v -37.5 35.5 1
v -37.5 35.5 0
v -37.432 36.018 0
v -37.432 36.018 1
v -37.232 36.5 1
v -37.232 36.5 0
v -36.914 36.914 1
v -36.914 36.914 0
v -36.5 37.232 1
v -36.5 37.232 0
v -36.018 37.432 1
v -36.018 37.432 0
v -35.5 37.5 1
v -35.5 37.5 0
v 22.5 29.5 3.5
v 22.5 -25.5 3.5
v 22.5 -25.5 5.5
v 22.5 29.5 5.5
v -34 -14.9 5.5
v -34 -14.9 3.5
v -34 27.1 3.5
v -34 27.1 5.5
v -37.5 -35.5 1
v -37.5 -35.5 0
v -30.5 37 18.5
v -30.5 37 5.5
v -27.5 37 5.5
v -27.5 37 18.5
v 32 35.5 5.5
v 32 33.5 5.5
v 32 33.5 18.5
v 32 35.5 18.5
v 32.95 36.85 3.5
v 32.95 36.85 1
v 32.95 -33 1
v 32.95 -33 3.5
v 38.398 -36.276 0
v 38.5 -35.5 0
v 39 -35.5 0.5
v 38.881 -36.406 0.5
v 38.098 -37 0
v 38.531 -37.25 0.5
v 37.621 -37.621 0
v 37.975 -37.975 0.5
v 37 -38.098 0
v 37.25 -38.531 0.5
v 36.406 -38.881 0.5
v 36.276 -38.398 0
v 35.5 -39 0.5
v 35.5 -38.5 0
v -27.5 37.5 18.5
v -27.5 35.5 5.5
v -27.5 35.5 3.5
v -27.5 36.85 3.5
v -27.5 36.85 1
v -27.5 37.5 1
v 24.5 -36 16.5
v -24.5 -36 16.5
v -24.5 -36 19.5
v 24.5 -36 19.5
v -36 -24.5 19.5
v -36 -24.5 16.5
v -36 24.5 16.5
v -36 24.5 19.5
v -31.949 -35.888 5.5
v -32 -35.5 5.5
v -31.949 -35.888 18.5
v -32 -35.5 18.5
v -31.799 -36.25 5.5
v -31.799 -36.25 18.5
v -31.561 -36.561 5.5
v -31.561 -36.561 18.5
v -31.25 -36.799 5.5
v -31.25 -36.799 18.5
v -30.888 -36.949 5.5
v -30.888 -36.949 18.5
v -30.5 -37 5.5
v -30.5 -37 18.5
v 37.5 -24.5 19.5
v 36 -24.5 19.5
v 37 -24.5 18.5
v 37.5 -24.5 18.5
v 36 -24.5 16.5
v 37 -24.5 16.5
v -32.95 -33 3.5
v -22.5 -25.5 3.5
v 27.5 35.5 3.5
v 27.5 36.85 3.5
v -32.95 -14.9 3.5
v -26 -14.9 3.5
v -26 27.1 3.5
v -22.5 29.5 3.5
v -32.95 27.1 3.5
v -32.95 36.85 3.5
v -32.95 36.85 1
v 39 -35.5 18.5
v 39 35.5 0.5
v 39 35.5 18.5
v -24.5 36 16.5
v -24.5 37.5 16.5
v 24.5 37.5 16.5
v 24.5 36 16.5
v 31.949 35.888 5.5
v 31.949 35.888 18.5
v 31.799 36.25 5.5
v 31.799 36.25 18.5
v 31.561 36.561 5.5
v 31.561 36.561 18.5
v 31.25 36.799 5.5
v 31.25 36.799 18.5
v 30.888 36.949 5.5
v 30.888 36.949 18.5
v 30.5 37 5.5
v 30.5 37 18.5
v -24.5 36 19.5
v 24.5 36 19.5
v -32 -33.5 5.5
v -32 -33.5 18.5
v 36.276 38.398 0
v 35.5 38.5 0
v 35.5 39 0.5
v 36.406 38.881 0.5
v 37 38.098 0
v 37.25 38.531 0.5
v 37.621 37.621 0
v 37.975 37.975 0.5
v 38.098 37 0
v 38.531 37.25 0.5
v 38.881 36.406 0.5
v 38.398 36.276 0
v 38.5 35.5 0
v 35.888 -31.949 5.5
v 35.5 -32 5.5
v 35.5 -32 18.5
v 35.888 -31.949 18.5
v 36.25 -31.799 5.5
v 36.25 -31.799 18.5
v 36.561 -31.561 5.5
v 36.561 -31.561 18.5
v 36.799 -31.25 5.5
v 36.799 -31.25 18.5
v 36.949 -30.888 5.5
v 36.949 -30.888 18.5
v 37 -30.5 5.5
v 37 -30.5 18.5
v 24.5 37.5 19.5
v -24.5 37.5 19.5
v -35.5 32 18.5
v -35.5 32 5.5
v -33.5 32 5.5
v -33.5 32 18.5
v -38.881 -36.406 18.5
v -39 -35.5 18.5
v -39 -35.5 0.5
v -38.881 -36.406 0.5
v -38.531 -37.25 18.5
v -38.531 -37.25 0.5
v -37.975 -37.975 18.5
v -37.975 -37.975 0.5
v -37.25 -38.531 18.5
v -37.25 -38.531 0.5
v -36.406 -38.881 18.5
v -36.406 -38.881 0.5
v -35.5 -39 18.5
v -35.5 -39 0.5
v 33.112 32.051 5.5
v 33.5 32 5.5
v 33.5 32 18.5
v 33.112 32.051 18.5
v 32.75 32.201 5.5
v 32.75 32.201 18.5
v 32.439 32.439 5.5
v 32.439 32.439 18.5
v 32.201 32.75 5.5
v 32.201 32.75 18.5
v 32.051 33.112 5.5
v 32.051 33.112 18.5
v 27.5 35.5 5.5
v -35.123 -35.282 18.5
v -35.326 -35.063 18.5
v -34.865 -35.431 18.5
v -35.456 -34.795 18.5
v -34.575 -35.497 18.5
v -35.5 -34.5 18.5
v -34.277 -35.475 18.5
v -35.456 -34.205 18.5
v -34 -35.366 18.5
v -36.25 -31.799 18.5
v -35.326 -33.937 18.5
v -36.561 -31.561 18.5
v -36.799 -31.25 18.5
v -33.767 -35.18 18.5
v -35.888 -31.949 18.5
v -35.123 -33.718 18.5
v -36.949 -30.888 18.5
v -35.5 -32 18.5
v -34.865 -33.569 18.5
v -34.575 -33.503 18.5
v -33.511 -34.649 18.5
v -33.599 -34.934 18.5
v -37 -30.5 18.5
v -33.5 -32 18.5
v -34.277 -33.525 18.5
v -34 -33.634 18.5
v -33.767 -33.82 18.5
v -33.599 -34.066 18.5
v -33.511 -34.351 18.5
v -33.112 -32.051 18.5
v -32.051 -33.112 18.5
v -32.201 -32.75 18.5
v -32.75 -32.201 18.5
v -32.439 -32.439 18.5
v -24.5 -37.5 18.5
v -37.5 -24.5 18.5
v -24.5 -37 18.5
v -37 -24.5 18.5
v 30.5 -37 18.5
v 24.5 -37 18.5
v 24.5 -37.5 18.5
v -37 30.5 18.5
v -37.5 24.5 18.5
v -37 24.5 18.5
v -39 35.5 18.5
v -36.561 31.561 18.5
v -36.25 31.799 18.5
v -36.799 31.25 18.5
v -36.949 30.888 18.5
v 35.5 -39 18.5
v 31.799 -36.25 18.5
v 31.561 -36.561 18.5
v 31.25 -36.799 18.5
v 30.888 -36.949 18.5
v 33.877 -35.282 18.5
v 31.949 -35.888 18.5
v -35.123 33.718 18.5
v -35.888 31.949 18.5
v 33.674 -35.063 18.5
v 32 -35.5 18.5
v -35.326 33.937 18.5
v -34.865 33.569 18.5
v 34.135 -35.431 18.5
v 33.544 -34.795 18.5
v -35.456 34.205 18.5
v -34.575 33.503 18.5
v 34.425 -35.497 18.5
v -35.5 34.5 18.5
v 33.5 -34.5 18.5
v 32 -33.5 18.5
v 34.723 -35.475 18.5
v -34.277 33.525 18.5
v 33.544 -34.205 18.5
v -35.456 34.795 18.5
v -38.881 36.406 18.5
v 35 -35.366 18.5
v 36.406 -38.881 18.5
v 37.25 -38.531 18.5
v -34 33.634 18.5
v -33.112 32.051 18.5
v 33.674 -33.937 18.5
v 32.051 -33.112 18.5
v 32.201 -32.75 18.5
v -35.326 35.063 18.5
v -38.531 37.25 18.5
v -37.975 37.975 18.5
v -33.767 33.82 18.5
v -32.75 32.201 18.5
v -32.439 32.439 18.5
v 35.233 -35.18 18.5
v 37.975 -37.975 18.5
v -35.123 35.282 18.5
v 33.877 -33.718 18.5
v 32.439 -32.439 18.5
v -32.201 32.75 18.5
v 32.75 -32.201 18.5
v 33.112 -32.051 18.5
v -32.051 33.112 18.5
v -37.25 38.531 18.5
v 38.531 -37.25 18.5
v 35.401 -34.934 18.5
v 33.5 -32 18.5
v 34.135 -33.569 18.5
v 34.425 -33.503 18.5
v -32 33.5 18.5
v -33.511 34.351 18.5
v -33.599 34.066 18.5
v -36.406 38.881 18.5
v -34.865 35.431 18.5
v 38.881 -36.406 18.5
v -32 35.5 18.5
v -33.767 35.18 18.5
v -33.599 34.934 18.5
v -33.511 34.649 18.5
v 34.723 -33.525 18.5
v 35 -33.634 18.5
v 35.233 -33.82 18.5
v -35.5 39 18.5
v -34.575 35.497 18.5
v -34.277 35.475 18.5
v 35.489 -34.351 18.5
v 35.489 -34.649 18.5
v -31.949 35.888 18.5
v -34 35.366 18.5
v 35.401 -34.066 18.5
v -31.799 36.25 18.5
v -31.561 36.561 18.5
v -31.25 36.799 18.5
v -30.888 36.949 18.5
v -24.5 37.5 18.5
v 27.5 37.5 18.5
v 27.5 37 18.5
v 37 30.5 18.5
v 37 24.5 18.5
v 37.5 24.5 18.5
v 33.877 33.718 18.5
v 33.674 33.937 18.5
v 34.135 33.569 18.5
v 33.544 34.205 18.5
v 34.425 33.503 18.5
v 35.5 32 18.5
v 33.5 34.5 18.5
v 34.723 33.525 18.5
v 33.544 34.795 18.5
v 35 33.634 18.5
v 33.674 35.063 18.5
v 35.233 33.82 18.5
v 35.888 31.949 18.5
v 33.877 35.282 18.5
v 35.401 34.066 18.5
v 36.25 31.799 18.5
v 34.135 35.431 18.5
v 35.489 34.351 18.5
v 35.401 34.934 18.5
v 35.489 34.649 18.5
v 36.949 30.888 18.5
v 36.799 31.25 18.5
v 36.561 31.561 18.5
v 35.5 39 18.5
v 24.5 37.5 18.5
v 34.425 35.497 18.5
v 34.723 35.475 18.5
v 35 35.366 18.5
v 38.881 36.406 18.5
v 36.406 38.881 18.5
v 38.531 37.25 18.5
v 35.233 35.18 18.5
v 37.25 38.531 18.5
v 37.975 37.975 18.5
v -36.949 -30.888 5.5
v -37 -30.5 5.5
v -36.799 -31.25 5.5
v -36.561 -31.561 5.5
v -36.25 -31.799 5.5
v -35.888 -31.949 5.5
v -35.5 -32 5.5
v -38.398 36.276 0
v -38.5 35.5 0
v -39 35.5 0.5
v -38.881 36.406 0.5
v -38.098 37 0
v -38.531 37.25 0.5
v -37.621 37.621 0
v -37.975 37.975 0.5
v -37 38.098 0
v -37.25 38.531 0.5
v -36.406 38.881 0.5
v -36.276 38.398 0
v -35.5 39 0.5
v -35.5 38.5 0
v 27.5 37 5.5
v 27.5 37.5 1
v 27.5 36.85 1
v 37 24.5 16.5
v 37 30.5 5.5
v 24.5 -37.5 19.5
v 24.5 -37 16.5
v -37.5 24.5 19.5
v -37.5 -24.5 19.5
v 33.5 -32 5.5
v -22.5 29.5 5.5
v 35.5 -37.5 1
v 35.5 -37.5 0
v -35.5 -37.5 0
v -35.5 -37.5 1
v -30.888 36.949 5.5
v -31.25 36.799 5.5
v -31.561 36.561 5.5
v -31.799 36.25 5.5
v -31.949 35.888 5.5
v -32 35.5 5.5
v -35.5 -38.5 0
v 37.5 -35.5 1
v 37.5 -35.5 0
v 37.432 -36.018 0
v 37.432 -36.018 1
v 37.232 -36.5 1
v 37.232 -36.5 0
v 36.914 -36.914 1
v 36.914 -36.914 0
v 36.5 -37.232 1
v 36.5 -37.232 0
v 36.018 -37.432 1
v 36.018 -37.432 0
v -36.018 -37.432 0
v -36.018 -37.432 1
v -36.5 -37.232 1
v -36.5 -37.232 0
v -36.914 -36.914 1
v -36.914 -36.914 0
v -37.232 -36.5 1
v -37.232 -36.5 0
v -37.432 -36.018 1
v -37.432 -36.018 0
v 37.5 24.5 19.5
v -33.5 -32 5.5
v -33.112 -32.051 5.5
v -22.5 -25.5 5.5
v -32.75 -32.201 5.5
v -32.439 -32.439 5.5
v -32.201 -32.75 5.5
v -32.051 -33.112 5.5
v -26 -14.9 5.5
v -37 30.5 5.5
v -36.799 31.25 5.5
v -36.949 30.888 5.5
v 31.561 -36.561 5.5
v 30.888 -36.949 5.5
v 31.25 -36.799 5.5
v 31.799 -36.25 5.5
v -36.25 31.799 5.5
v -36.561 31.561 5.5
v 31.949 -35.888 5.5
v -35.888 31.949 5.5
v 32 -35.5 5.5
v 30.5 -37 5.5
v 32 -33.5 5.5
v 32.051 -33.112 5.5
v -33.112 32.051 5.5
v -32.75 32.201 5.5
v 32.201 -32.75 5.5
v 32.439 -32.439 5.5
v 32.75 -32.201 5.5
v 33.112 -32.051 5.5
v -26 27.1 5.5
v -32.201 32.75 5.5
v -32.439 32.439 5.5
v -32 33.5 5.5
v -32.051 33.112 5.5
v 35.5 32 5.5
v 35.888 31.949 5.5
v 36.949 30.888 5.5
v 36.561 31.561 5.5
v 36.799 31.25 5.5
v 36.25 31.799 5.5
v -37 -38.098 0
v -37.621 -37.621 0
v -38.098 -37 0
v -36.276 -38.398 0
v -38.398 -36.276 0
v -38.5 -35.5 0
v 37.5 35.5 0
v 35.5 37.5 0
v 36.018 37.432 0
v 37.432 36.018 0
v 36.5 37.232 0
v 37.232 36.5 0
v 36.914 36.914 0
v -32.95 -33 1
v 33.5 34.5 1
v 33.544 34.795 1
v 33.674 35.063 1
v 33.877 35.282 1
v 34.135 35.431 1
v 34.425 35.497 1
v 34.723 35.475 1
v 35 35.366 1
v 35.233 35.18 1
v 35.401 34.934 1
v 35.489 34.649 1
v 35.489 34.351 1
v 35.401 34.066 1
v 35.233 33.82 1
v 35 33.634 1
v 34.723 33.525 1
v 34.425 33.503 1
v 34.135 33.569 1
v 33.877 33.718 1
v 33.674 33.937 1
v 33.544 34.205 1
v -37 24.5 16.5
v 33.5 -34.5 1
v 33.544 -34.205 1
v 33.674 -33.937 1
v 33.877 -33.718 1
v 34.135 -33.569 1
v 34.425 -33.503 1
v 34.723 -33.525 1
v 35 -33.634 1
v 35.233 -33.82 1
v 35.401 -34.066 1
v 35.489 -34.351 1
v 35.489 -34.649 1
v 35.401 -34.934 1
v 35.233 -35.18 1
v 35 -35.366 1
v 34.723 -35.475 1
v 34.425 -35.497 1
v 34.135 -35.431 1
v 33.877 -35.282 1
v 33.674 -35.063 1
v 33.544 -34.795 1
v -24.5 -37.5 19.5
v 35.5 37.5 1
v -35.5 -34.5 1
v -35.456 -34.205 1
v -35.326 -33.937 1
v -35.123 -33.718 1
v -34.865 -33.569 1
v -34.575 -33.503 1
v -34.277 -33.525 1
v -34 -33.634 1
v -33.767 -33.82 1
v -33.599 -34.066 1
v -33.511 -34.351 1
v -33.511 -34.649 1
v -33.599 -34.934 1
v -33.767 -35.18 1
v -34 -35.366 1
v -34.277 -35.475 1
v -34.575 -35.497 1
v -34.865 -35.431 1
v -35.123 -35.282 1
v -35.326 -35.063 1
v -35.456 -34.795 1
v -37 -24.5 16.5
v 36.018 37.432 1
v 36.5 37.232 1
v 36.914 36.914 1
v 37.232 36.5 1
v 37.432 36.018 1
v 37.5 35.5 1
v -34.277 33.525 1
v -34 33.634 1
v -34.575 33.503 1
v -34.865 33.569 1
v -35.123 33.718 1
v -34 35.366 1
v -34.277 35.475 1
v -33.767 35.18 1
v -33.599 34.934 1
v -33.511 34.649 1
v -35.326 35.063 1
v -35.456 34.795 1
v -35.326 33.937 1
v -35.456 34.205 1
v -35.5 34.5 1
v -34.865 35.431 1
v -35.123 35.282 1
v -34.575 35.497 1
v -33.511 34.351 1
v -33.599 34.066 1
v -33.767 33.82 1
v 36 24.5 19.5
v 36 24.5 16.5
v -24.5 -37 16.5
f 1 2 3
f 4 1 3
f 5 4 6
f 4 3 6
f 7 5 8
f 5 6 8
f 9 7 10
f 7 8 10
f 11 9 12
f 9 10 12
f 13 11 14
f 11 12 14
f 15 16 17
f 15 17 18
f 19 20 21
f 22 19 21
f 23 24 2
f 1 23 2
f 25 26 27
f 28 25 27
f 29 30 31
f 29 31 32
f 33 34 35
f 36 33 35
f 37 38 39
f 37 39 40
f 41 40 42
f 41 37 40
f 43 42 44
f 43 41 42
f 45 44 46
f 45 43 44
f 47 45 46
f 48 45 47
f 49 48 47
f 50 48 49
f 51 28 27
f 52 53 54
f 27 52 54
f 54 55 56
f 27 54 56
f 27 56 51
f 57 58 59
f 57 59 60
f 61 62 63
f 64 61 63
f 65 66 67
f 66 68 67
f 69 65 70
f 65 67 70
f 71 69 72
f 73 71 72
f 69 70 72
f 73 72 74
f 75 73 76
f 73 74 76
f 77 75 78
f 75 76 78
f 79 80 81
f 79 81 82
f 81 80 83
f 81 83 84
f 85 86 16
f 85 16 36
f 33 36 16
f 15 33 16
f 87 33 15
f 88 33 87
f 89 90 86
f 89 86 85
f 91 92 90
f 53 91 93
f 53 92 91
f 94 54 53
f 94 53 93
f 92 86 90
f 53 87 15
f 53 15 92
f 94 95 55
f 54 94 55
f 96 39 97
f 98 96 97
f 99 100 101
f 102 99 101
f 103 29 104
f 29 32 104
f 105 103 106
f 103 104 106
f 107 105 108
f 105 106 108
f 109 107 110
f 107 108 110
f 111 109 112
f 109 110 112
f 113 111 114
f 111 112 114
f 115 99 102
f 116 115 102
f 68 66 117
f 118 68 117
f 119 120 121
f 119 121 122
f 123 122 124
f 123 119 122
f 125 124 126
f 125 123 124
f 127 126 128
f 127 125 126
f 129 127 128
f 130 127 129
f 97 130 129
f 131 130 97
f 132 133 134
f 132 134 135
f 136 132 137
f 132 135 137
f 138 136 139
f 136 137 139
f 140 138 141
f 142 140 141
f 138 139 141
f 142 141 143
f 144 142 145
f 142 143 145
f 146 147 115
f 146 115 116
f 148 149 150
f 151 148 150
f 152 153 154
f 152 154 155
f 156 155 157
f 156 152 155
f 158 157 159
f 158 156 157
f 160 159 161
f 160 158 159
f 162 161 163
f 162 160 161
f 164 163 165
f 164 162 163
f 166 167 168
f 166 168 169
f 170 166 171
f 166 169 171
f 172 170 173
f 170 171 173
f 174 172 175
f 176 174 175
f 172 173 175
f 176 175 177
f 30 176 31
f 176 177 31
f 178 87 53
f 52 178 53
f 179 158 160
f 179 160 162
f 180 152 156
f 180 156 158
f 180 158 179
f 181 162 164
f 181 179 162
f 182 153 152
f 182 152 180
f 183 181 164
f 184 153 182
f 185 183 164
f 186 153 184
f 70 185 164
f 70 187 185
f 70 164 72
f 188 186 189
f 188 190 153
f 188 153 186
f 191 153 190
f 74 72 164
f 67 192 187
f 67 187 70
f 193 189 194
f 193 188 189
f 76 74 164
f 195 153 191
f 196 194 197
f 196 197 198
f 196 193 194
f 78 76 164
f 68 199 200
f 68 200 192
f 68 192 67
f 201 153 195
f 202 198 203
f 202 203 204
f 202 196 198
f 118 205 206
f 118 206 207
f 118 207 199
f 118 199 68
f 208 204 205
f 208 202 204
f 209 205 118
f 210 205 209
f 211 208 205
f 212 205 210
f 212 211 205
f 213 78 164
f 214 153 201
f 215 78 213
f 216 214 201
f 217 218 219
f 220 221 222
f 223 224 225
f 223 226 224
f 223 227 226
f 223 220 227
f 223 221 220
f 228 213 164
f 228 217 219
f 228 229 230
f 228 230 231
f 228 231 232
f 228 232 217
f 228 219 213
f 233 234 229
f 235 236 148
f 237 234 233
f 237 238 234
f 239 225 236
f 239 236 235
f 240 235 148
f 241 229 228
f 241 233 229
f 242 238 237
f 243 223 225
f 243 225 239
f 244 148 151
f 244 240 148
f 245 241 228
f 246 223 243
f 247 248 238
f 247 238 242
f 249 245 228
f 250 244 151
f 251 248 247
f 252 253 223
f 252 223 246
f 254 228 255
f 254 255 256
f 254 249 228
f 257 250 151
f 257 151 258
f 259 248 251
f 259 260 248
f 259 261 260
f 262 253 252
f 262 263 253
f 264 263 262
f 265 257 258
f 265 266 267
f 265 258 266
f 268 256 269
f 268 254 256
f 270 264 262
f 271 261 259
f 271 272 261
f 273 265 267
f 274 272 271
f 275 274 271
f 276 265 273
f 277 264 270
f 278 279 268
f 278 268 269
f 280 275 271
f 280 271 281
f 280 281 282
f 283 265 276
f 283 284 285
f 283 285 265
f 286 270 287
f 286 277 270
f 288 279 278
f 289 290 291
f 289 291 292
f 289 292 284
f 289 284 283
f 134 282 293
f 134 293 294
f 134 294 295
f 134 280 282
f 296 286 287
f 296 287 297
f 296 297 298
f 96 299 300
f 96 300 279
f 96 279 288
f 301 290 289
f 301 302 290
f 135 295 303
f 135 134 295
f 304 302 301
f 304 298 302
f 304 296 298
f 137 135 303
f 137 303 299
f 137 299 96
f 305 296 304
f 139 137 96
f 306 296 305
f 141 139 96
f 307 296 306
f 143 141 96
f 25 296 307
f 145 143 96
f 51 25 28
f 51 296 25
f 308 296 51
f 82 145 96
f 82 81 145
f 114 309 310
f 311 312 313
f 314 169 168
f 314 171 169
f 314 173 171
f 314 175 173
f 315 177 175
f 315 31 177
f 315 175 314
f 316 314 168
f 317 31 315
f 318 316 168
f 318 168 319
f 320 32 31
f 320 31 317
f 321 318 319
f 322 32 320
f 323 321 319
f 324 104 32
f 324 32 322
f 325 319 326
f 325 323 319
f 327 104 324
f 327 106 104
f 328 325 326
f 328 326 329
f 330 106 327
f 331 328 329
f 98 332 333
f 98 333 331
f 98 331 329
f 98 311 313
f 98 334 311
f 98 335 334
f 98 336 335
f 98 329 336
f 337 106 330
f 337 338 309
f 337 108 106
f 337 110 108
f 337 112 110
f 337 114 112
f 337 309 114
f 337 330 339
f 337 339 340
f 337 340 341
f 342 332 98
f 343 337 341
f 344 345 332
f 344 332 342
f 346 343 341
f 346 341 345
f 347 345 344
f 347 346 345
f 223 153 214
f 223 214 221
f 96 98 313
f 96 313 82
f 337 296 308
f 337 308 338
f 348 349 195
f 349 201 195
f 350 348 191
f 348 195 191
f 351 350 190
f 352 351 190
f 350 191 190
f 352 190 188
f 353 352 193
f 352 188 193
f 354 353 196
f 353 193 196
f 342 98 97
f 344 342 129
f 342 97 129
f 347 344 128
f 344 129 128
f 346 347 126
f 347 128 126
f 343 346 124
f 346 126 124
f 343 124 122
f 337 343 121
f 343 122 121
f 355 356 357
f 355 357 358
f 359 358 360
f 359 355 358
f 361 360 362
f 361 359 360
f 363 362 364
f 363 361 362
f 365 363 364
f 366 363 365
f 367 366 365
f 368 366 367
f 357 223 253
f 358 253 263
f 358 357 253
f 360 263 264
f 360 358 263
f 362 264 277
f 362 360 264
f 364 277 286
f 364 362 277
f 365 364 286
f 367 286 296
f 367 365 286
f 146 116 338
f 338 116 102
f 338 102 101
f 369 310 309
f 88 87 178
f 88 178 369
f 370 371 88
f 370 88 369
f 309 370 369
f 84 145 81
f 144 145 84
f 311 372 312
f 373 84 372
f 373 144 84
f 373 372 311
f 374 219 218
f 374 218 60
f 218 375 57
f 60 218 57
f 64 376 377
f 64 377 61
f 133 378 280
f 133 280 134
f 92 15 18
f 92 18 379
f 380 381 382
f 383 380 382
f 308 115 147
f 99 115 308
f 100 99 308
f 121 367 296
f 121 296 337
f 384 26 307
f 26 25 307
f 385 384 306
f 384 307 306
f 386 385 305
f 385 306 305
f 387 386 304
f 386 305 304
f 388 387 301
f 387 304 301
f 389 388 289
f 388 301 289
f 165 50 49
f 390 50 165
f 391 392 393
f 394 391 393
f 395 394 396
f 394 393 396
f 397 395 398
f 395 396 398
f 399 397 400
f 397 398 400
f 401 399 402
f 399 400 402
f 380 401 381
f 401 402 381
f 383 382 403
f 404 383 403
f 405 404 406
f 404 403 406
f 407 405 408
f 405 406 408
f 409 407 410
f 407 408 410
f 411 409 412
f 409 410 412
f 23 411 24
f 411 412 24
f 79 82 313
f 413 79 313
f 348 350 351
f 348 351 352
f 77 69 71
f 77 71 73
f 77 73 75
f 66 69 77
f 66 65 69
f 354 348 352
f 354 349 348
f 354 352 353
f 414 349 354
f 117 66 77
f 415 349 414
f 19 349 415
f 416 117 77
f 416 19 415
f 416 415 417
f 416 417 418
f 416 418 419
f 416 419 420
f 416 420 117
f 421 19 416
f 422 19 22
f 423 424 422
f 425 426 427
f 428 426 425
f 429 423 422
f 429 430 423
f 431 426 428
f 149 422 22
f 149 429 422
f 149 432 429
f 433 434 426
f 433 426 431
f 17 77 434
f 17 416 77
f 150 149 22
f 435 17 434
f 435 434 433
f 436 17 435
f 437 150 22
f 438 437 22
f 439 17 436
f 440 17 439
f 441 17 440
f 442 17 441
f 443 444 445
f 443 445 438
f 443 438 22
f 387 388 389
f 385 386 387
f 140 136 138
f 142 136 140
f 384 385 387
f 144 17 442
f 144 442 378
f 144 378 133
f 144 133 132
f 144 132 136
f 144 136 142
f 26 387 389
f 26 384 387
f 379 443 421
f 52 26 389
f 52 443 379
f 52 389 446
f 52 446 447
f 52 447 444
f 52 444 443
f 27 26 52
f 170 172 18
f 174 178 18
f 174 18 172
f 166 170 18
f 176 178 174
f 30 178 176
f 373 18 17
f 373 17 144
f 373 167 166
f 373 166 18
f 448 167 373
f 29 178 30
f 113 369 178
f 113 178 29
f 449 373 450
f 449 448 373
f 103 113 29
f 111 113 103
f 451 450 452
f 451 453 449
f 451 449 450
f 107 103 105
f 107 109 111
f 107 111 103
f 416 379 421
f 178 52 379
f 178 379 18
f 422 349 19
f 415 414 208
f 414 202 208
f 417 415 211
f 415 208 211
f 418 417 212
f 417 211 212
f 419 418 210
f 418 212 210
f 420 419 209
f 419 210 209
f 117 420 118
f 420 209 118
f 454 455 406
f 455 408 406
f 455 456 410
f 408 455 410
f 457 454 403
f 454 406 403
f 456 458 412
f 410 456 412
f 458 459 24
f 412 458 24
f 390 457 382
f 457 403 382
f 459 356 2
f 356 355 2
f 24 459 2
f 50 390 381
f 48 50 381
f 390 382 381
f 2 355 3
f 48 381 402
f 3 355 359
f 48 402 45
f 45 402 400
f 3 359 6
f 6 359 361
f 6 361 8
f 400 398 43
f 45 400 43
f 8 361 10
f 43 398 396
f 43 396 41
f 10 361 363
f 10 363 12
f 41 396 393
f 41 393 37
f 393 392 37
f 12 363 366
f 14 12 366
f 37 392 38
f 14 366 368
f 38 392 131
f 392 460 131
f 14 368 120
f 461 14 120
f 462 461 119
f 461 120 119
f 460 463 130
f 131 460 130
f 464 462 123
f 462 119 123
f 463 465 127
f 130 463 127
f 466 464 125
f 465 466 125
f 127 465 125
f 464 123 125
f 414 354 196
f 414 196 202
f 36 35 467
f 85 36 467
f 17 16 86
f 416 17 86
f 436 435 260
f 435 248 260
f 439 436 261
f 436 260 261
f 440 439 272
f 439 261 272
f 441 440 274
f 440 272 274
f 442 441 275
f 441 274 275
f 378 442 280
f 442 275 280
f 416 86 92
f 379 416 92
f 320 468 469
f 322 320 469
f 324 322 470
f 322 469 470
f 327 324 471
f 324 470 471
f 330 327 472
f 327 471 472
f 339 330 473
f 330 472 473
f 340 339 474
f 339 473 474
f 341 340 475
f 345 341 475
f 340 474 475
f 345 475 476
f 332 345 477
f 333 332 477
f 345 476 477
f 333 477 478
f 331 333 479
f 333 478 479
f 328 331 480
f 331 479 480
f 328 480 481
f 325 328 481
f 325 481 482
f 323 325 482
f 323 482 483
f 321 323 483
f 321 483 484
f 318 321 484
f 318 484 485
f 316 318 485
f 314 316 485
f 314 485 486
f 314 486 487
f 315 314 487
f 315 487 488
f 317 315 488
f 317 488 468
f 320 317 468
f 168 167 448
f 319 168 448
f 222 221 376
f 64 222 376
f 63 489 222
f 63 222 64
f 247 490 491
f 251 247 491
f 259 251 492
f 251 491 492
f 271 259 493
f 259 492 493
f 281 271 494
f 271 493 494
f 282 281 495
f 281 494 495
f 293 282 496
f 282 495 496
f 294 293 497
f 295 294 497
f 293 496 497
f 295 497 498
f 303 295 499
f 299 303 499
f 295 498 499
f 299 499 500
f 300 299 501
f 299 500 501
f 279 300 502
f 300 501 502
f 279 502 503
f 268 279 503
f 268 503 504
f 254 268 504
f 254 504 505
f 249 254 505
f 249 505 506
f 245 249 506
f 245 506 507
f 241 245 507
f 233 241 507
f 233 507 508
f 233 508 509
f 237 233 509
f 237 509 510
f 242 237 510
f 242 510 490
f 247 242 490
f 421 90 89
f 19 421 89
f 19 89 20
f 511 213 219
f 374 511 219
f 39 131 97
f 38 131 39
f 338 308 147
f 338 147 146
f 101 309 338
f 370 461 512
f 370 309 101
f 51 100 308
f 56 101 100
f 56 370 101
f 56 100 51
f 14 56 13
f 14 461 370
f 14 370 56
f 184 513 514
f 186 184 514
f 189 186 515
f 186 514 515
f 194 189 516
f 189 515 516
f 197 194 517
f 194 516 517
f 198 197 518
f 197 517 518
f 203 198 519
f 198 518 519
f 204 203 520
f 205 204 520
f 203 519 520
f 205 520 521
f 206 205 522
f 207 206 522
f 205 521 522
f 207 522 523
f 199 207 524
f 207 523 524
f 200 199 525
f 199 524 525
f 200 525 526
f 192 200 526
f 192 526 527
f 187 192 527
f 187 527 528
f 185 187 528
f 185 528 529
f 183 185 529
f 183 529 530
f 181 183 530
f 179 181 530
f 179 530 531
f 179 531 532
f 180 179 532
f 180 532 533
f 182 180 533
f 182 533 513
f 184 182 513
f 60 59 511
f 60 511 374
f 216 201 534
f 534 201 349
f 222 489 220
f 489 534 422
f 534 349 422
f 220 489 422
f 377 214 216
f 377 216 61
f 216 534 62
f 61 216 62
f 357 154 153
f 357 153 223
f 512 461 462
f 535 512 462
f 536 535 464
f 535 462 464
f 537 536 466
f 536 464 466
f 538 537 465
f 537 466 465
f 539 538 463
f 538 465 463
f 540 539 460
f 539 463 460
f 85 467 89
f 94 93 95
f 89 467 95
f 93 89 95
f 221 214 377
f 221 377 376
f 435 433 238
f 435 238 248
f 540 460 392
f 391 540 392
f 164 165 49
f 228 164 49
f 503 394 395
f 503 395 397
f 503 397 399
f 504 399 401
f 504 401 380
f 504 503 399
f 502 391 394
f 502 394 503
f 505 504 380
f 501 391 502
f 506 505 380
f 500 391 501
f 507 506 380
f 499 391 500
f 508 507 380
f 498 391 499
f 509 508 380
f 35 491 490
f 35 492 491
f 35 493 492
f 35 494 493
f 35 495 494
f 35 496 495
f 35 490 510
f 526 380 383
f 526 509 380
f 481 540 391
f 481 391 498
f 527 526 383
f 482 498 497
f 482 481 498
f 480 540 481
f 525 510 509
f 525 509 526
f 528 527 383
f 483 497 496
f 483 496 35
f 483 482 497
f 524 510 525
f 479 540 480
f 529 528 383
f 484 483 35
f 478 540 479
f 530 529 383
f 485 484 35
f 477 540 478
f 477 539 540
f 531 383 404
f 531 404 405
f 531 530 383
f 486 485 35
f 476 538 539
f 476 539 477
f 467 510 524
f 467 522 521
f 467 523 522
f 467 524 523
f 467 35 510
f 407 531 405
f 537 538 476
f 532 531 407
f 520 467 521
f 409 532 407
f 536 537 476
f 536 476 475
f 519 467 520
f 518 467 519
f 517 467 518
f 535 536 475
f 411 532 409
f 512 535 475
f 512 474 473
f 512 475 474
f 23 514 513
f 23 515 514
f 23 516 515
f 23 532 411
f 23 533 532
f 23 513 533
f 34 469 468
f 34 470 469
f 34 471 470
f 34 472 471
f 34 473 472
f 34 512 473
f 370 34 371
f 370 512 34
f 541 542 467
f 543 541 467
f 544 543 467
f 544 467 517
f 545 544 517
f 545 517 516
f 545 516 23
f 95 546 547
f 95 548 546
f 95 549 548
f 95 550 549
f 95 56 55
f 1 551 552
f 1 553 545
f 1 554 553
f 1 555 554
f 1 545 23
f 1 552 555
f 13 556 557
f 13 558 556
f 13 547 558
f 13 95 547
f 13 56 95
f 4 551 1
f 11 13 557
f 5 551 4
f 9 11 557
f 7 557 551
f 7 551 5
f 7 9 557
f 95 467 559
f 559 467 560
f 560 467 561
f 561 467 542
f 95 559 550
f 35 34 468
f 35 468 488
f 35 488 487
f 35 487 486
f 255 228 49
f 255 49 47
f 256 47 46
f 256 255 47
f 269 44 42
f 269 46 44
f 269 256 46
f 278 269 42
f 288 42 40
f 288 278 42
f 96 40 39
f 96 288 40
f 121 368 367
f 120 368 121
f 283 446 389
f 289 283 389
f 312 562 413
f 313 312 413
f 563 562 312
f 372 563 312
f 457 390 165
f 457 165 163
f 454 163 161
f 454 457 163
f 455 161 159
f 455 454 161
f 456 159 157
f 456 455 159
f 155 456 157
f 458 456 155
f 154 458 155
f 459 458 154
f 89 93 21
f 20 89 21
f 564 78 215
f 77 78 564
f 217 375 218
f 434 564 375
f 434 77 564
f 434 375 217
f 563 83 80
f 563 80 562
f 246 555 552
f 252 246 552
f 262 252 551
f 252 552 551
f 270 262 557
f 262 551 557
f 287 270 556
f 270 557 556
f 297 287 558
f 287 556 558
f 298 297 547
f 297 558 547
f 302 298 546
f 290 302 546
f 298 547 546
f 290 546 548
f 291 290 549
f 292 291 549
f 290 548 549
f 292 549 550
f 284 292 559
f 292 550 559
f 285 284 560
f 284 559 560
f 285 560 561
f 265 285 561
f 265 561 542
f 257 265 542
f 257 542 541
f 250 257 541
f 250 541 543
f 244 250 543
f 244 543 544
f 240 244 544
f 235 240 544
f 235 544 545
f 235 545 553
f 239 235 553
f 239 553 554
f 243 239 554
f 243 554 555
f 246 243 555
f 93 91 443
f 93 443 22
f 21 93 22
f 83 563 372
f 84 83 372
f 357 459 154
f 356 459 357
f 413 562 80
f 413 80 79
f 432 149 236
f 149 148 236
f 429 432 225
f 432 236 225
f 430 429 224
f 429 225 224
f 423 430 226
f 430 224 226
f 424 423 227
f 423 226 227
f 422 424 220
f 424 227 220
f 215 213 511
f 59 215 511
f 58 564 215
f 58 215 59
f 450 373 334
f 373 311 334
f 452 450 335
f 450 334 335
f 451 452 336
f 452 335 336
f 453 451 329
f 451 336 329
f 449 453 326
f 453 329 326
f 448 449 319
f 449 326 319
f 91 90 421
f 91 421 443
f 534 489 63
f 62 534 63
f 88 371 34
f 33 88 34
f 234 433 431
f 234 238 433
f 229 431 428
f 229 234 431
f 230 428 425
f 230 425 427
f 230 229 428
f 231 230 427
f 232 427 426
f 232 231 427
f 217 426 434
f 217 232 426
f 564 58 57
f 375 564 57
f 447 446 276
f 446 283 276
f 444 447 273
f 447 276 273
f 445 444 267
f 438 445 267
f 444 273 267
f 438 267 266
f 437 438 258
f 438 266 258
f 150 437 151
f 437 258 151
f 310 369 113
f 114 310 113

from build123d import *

# Parameters (mm, degrees)
SKETCH_1_W           = 78
SKETCH_1_H           = 78
EXTRUDE_1_DEPTH      = 5.5
SKETCH_2_W           = 78
SKETCH_2_H           = 78
SKETCH_2_W_2         = 74
SKETCH_2_H_2         = 74
SKETCH_2_W_3         = 5
SKETCH_2_H_3         = 5
EXTRUDE_2_DEPTH      = 13
FILLET_1_R           = 1.5
FILLET_2_R           = 3.5
CUT_EXTRUDE_1_DEPTH  = 1
CUT_EXTRUDE_2_DEPTH  = 2.5
SKETCH_5_R           = 1
CUT_EXTRUDE_3_DEPTH  = 58.864064842
CHAMFER_1_SIZE       = 0.5
SKETCH_6_W           = 55
SKETCH_6_H           = 2
SKETCH_6_W_2         = 45
SKETCH_6_H_2         = 55
SKETCH_6_W_3         = 8
SKETCH_6_H_3         = 42
CUT_EXTRUDE_4_DEPTH  = 58.15767665
EXTRUDE_3_DEPTH      = 1
EXTRUDE_3_DEPTH_BACK = 2
SKETCH_7_W           = 49
SKETCH_7_H           = 1.5
SKETCH_7_W_2         = 1.5
SKETCH_7_H_2         = 49


with BuildPart() as part:
    # 草图1 → 凸台-拉伸1 (new body)
    with BuildSketch(Plane.XY):
        Rectangle(SKETCH_1_W, SKETCH_1_H)
    extrude(amount=EXTRUDE_1_DEPTH)

    # 草图2 → 凸台-拉伸2 (add)
    # profile 1 of 5: a face of its own
    with BuildSketch(Plane.XY.offset(5.5)):
        Rectangle(SKETCH_2_W, SKETCH_2_H)
        Rectangle(SKETCH_2_W_2, SKETCH_2_H_2, mode=Mode.SUBTRACT)
    # profile 2 of 5: a face of its own
    with BuildSketch(Plane.XY.offset(5.5)):
        with Locations((-34.5, 34.5)):
            Rectangle(SKETCH_2_W_3, SKETCH_2_H_3)
    # profile 3 of 5: a face of its own
    with BuildSketch(Plane.XY.offset(5.5)):
        with Locations((34.5, 34.5)):
            Rectangle(SKETCH_2_W_3, SKETCH_2_H_3)
    # profile 4 of 5: a face of its own
    with BuildSketch(Plane.XY.offset(5.5)):
        with Locations((34.5, -34.5)):
            Rectangle(SKETCH_2_W_3, SKETCH_2_H_3)
    # profile 5 of 5: a face of its own
    with BuildSketch(Plane.XY.offset(5.5)):
        with Locations((-34.5, -34.5)):
            Rectangle(SKETCH_2_W_3, SKETCH_2_H_3)
    extrude(amount=EXTRUDE_2_DEPTH)

    # 圆角1
    fillet_1_edges = [part.edges().sort_by_distance(p)[0] for p in [
        (-37, -32, 12),
        (-37, 32, 12),
        (-32, 32, 12),
        (-32, 37, 12),
        (32, 37, 12),
        (32, 32, 12),
        (37, 32, 12),
        (37, -32, 12),
        (32, -32, 12),
        (32, -37, 12),
        (-32, -37, 12),
        (-32, -32, 12),
    ]]
    fillet(fillet_1_edges, radius=FILLET_1_R)

    # 圆角2
    fillet_2_edges = [part.edges().sort_by_distance(p)[0] for p in [
        (39, -39, 9.25),
        (-39, -39, 9.25),
        (-39, 39, 9.25),
        (39, 39, 9.25),
    ]]
    fillet(fillet_2_edges, radius=FILLET_2_R)

    # 草图3 → 切除-拉伸1 (cut)
    with BuildSketch(Plane(origin=(0, 0, 0), x_dir=(-1, 0, 0), z_dir=(0, 0, -1))):
        with BuildLine():
            Line((37.5, -35.5), (37.5, 35.5))
            ThreePointArc((37.5, 35.5), (36.914213562, 36.914213562), (35.5, 37.5))
            Line((35.5, 37.5), (-35.5, 37.5))
            ThreePointArc((-35.5, 37.5), (-36.914213562, 36.914213562), (-37.5, 35.5))
            Line((-37.5, 35.5), (-37.5, -35.5))
            ThreePointArc((-37.5, -35.5), (-36.914213562, -36.914213562), (-35.5, -37.5))
            Line((-35.5, -37.5), (35.5, -37.5))
            ThreePointArc((35.5, -37.5), (36.914213562, -36.914213562), (37.5, -35.5))
        make_face()
    extrude(amount=-CUT_EXTRUDE_1_DEPTH, mode=Mode.SUBTRACT)

    # 草图4 → 切除-拉伸2 (cut)
    with BuildSketch(Plane(origin=(0, 0, 1), x_dir=(-1, 0, 0), z_dir=(0, 0, -1))):
        Polygon((27.5, 37.5), (-27.5, 37.5), (-27.5, 36.85), (-32.95, 36.85), (-32.95, -33), (32.95, -33), (32.95, 36.85), (27.5, 36.85), align=None)
    extrude(amount=-CUT_EXTRUDE_2_DEPTH, mode=Mode.SUBTRACT)

    # 草图5 → 切除-拉伸3 (cut, through all)
    with BuildSketch(Plane(origin=(0, 0, 1), x_dir=(-1, 0, 0), z_dir=(0, 0, -1))):
        with Locations((-34.5, 34.5)):
            Circle(SKETCH_5_R)
        with Locations((34.5, 34.5)):
            Circle(SKETCH_5_R)
        with Locations((34.5, -34.5)):
            Circle(SKETCH_5_R)
        with Locations((-34.5, -34.5)):
            Circle(SKETCH_5_R)
    extrude(amount=-CUT_EXTRUDE_3_DEPTH, mode=Mode.SUBTRACT)

    # 倒角1
    chamfer_1_edges = [part.edges().sort_by_distance(p)[0] for p in [
        (-39, 0, 0),
        (39, 0, 0),
        (0, -39, 0),
        (0, 39, 0),
        (-37.974873734, -37.974873734, 0),
        (37.974873734, -37.974873734, 0),
        (37.974873734, 37.974873734, 0),
        (-37.974873734, 37.974873734, 0),
    ]]
    chamfer(chamfer_1_edges, length=CHAMFER_1_SIZE)

    # 草图6 → 切除-拉伸4 (cut, through all)
    with BuildSketch(Plane(origin=(0, 0, 3.5), x_dir=(-1, 0, 0), z_dir=(0, 0, -1))):
        with Locations((0, 36.5)):
            Rectangle(SKETCH_6_W, SKETCH_6_H)
        with Locations((0, 2)):
            Rectangle(SKETCH_6_W_2, SKETCH_6_H_2)
        with Locations((30, 6.1)):
            Rectangle(SKETCH_6_W_3, SKETCH_6_H_3)
    extrude(amount=-CUT_EXTRUDE_4_DEPTH, mode=Mode.SUBTRACT)

    # 草图7 → 凸台-拉伸3 (add, two sides: drawn at the far end of the back side and taken through both)
    with BuildSketch(Plane.XY.offset(18.5).offset(-EXTRUDE_3_DEPTH_BACK)):
        with Locations((0, 36.75)):
            Rectangle(SKETCH_7_W, SKETCH_7_H)
        with Locations((-36.75, 0)):
            Rectangle(SKETCH_7_W_2, SKETCH_7_H_2)
        with Locations((0, -36.75)):
            Rectangle(SKETCH_7_W, SKETCH_7_H)
        with Locations((36.75, 0)):
            Rectangle(SKETCH_7_W_2, SKETCH_7_H_2)
    extrude(amount=EXTRUDE_3_DEPTH + EXTRUDE_3_DEPTH_BACK)


solid = part.part
